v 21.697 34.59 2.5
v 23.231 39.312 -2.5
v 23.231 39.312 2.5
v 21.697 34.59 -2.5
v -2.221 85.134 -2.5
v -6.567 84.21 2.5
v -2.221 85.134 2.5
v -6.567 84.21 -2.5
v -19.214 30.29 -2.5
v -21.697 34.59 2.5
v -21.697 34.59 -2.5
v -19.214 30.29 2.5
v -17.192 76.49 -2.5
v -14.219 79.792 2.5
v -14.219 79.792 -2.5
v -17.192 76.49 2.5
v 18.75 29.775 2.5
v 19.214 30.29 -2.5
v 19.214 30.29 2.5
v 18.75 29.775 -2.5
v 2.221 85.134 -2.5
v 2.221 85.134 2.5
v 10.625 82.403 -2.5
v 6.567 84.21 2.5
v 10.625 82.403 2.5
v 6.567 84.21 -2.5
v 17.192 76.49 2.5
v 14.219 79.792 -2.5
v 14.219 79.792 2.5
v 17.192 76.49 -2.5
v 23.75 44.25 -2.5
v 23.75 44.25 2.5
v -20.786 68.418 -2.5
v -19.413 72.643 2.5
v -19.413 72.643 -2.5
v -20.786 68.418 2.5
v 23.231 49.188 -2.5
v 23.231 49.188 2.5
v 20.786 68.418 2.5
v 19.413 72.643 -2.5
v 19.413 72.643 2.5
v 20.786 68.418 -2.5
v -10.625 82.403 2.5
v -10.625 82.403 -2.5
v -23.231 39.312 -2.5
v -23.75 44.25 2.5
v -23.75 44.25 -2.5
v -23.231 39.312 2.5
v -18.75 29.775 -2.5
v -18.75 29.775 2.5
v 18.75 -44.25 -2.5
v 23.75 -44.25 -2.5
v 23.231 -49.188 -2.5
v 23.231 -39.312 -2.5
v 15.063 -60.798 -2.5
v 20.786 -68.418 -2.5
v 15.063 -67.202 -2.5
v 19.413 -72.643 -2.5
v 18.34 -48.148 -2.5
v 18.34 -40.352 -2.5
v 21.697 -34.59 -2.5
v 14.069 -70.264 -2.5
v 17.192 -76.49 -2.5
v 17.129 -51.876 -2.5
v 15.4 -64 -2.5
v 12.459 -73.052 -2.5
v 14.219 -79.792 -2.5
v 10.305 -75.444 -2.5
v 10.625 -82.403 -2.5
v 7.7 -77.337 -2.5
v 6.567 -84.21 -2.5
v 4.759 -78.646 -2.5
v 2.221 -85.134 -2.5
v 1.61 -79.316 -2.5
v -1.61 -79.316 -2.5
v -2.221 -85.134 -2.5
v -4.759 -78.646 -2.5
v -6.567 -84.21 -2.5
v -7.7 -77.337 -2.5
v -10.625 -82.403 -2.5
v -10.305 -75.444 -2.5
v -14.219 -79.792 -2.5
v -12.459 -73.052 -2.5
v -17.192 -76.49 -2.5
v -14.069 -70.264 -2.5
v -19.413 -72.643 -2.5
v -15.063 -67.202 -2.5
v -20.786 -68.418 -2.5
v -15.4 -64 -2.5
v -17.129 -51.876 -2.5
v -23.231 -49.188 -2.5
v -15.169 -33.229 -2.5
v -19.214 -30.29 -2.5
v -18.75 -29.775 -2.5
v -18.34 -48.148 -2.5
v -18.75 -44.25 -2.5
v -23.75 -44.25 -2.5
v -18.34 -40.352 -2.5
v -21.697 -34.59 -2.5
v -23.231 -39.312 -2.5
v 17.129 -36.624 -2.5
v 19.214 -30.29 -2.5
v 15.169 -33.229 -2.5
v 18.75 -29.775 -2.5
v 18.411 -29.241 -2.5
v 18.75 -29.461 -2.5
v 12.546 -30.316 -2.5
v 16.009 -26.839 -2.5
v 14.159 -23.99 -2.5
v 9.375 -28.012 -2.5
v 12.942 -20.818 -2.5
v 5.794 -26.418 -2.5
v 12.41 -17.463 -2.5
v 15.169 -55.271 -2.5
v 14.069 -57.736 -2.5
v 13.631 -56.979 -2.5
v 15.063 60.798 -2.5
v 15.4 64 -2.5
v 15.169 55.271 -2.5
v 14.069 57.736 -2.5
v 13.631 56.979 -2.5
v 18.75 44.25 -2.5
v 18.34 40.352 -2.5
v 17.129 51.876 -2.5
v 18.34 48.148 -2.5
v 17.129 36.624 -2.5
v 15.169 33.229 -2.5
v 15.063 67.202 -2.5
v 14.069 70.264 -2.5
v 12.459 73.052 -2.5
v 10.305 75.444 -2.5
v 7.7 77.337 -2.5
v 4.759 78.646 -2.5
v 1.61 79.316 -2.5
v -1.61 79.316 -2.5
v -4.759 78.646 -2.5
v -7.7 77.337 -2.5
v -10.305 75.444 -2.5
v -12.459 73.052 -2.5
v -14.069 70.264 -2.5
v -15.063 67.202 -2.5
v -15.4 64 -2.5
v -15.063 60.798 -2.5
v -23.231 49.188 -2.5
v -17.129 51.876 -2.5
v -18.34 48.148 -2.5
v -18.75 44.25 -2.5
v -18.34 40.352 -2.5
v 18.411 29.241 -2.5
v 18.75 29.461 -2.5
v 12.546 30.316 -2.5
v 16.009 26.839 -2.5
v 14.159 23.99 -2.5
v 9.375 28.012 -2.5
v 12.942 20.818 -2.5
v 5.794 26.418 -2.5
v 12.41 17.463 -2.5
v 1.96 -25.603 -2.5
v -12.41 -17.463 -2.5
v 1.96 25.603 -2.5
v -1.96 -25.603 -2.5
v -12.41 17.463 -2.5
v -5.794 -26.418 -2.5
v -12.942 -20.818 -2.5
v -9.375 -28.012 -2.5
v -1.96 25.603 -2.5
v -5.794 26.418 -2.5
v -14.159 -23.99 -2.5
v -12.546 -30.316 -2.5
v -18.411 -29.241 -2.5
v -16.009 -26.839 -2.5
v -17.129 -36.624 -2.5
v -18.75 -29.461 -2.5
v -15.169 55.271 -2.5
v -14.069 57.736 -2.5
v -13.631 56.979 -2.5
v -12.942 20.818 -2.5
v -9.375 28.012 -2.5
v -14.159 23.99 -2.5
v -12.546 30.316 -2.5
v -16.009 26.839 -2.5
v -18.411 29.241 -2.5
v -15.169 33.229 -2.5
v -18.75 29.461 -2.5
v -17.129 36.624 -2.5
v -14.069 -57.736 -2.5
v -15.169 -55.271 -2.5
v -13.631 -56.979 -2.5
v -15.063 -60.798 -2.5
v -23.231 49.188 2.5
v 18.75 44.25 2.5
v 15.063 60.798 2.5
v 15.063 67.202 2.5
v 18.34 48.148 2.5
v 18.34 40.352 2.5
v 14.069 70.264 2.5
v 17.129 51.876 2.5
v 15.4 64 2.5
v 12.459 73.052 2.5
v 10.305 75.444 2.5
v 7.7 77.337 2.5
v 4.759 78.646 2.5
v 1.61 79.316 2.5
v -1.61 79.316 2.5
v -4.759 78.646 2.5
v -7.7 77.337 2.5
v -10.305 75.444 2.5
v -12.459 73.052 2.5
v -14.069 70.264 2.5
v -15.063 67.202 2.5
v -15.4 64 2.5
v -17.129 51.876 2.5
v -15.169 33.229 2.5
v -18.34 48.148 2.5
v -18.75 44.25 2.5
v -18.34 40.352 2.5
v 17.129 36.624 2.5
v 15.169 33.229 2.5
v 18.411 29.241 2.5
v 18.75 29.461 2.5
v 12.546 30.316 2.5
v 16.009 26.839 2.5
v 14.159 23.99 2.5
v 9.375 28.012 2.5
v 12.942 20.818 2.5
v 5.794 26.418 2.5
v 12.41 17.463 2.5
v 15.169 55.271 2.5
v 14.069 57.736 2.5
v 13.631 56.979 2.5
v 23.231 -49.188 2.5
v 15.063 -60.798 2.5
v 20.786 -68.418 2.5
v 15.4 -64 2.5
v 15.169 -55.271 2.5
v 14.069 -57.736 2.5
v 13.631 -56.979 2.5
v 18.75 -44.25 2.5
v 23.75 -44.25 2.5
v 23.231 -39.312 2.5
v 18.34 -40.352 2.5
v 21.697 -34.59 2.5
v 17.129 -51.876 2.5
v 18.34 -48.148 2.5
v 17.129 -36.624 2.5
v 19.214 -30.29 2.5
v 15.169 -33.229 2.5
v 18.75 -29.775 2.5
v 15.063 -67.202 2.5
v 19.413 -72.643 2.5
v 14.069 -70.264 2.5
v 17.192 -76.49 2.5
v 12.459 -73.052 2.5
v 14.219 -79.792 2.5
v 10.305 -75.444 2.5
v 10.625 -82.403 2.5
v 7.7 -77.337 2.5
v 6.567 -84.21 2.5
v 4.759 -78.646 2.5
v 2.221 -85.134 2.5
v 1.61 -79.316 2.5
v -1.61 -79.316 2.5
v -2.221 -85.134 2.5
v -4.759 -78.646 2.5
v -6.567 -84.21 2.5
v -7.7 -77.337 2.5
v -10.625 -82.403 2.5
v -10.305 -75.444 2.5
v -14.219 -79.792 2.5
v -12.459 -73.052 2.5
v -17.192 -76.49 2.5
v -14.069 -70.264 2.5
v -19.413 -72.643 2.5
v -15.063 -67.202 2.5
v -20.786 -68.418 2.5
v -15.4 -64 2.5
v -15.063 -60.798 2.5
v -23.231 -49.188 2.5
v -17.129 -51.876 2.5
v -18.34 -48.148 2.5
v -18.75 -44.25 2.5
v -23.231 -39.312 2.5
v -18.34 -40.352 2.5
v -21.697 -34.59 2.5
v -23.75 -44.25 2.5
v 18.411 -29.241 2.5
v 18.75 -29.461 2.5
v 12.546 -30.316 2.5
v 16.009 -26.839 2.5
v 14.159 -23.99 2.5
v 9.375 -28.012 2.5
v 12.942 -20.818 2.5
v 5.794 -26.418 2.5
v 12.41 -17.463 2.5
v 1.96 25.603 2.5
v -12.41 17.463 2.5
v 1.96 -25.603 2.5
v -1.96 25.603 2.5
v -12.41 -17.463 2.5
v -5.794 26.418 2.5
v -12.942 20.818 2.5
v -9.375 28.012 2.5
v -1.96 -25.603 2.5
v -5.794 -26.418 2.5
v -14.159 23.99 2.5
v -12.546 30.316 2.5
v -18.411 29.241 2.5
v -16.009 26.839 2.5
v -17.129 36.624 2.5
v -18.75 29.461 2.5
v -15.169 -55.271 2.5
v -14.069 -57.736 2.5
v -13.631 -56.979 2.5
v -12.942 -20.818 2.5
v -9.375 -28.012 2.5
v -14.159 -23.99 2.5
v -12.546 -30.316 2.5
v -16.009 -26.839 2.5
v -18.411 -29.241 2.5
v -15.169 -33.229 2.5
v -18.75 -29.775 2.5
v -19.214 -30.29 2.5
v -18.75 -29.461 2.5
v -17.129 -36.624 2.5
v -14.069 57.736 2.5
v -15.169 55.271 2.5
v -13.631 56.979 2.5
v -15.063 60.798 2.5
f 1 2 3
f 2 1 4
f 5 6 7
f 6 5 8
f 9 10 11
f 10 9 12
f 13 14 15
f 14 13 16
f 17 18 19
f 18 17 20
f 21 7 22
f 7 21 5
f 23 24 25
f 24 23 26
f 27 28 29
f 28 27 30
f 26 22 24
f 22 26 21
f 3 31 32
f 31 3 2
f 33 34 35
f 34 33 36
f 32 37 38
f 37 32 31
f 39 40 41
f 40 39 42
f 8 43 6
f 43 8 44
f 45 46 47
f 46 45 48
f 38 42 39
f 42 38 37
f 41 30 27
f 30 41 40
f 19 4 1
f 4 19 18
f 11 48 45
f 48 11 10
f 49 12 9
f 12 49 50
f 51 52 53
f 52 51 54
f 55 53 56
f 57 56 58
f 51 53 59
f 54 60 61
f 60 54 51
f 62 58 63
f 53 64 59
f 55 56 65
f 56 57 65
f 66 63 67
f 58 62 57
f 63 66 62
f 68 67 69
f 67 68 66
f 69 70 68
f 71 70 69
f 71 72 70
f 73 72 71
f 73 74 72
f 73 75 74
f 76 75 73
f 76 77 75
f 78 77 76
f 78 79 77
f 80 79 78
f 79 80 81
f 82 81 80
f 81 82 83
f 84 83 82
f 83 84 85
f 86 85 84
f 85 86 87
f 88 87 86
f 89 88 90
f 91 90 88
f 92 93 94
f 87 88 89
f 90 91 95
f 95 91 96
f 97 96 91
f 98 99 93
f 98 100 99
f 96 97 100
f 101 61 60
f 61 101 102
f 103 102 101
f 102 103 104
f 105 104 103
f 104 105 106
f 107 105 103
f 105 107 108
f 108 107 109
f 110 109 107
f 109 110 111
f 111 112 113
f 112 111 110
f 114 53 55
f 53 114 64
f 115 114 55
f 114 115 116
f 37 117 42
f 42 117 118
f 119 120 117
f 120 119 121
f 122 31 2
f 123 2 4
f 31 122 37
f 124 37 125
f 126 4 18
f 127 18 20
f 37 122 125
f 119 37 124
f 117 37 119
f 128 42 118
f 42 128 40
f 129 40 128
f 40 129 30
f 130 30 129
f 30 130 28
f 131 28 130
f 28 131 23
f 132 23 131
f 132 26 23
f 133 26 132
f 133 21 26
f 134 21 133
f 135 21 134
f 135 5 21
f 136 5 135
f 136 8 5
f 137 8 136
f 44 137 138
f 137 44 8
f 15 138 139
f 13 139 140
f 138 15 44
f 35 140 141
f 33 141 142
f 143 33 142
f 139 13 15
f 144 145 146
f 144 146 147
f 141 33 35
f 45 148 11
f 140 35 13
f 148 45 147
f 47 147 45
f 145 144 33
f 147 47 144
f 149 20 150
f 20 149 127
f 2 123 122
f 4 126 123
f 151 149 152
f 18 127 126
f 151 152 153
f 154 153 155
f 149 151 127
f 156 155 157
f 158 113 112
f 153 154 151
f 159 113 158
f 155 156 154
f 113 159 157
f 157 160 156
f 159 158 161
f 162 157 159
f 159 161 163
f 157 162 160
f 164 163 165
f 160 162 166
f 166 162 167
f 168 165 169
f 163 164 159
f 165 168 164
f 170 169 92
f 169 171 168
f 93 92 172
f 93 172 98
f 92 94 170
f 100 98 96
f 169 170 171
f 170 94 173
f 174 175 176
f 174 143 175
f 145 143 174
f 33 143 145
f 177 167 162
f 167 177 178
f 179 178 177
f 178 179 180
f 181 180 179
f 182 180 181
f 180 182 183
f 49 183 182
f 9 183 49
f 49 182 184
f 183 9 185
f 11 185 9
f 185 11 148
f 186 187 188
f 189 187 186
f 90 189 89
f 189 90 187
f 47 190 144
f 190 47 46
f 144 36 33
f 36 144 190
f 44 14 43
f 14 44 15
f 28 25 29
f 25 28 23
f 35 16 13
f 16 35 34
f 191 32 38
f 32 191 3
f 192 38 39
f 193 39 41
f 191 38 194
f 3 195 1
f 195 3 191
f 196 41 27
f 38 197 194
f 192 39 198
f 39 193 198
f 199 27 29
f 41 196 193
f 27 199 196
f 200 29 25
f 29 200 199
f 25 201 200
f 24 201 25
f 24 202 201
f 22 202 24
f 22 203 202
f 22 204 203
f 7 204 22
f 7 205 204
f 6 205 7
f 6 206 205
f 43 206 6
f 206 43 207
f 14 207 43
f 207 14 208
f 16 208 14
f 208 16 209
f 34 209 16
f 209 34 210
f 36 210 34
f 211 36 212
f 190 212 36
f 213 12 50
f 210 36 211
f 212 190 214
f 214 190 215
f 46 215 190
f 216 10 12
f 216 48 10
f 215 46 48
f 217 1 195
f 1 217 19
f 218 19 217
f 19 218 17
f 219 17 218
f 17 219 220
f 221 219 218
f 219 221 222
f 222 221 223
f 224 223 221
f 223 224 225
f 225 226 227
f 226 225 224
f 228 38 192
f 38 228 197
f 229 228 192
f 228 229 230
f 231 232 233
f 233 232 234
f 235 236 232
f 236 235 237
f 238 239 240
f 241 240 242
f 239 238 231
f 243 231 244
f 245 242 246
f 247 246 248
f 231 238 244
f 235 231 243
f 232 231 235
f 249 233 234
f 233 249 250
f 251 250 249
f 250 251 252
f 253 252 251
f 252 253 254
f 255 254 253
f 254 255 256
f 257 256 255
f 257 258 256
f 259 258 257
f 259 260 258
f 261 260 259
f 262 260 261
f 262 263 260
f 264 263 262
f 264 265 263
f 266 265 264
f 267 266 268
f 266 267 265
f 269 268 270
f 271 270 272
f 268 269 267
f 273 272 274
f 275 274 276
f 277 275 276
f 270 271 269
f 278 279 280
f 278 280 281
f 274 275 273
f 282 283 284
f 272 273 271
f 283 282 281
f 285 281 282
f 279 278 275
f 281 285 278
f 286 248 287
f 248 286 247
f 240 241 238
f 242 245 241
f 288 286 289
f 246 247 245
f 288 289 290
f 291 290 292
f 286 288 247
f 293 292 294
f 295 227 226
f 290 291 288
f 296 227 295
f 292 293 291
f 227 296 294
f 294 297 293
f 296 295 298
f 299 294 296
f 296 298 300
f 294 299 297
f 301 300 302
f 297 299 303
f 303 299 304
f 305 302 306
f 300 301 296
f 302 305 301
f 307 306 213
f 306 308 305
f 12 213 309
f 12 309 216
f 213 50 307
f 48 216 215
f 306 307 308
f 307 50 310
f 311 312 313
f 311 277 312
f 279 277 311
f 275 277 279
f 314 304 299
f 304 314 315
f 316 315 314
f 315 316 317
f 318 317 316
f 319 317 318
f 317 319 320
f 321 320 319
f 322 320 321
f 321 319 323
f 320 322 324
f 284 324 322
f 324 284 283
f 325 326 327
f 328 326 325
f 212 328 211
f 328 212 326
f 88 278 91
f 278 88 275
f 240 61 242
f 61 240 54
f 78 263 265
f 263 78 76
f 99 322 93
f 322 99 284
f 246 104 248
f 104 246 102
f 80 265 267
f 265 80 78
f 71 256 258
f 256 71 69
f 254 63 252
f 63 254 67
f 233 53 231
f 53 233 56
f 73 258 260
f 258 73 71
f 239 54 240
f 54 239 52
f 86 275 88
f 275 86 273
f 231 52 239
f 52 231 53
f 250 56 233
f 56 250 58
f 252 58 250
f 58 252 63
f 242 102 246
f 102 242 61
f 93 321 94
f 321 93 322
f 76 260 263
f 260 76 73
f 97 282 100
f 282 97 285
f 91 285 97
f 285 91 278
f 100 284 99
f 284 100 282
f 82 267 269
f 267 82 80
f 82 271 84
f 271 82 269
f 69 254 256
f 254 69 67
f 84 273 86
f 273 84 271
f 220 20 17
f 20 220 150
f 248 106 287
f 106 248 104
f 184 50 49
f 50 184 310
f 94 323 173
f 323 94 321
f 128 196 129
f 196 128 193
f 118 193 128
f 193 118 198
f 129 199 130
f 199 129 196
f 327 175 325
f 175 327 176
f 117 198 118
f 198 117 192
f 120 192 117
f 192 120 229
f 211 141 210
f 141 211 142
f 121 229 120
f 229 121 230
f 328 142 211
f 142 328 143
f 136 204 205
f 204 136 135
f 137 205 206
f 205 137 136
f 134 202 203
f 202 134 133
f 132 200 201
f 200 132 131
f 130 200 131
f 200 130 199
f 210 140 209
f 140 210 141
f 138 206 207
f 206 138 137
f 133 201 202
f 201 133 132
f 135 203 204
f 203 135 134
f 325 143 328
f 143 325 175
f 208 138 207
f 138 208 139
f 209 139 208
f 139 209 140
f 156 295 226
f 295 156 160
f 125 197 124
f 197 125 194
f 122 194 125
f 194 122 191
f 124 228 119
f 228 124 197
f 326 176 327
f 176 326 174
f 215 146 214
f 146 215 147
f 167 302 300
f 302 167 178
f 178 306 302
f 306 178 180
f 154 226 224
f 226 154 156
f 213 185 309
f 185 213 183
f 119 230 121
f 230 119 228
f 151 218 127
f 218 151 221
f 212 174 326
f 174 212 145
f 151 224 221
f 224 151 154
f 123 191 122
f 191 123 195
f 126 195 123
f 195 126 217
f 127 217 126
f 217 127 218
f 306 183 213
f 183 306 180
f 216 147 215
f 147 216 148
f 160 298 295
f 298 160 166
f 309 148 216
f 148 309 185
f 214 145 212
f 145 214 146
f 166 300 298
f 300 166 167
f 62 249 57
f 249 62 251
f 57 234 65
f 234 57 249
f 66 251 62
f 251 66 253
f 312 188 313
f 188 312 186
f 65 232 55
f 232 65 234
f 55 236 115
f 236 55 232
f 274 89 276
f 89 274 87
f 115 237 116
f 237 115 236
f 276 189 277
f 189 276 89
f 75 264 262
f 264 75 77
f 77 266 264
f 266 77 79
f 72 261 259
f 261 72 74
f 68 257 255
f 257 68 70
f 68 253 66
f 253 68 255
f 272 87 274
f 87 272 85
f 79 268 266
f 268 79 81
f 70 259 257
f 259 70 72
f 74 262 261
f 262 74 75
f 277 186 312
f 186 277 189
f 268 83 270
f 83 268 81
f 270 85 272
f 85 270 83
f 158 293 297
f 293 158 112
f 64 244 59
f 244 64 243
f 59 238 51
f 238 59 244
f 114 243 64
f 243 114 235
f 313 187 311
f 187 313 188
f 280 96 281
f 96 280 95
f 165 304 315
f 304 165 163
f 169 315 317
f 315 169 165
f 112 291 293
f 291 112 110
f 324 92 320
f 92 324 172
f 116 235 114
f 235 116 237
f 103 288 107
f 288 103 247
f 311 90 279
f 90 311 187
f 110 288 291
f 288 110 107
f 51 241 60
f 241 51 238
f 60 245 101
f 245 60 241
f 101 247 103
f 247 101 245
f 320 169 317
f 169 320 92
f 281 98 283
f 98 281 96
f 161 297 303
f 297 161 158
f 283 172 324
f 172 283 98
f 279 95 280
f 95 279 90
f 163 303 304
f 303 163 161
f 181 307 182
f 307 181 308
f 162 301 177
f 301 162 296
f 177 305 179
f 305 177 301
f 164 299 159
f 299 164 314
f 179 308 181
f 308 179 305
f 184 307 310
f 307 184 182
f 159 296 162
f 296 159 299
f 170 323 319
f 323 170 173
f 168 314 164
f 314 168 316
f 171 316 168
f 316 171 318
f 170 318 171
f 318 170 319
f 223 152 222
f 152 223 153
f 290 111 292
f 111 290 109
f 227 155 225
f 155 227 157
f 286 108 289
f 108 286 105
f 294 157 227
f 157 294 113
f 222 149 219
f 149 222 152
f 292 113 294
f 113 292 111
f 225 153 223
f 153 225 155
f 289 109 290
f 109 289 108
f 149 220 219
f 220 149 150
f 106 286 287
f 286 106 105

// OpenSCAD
lipdiameter=37.5; //[22:52]
neckdiameter=30.8; //[20:50]
bottlewidth=128; //[80:200]
thickness=5; //1
beveled_handle=true; //comment

difference(){
    union(){
        cube([lipdiameter,bottlewidth,thickness],center=true);
        for (i = [0:1]) {
            rotate([i*180,0,0])
            hull(){
                translate([0,bottlewidth/2,0]) cylinder(d=lipdiameter+5,h=thickness, center=true);
                translate([0,bottlewidth/2-lipdiameter/2-1,0]) cylinder(d=lipdiameter+10,h=thickness, center=true);
            }
        }
    }

    for (i = [0:1]) {
        rotate([i*180,0,0]) union() {
        translate([0,bottlewidth/2,0]) cylinder(d=neckdiameter,h=thickness+1, center=true);
        translate([0,bottlewidth/2-lipdiameter/2-1,0]) cylinder(d=lipdiameter,h=thickness+1, center=true);
        }
    }
    if(beveled_handle){
        hull(){
            translate([0,bottlewidth/2-lipdiameter/2,0]) rotate ([0,0,135]) translate([0,lipdiameter+3,0]) cylinder(d=lipdiameter-5,h=thickness+1, center=true);
            translate([0,-(bottlewidth/2-lipdiameter/2),0]) rotate ([0,0,45]) translate([0,lipdiameter+3,0]) cylinder(d=lipdiameter-5,h=thickness+1, center=true);
        }
        
        hull(){
            translate([0,bottlewidth/2-lipdiameter/2,0]) rotate ([0,0,-135]) translate([0,lipdiameter+3,0]) cylinder(d=lipdiameter-5,h=thickness+1, center=true);
            translate([0,-(bottlewidth/2-lipdiameter/2),0]) rotate ([0,0,-45]) translate([0,lipdiameter+3,0]) cylinder(d=lipdiameter-5,h=thickness+1, center=true);
        }
    }
}
